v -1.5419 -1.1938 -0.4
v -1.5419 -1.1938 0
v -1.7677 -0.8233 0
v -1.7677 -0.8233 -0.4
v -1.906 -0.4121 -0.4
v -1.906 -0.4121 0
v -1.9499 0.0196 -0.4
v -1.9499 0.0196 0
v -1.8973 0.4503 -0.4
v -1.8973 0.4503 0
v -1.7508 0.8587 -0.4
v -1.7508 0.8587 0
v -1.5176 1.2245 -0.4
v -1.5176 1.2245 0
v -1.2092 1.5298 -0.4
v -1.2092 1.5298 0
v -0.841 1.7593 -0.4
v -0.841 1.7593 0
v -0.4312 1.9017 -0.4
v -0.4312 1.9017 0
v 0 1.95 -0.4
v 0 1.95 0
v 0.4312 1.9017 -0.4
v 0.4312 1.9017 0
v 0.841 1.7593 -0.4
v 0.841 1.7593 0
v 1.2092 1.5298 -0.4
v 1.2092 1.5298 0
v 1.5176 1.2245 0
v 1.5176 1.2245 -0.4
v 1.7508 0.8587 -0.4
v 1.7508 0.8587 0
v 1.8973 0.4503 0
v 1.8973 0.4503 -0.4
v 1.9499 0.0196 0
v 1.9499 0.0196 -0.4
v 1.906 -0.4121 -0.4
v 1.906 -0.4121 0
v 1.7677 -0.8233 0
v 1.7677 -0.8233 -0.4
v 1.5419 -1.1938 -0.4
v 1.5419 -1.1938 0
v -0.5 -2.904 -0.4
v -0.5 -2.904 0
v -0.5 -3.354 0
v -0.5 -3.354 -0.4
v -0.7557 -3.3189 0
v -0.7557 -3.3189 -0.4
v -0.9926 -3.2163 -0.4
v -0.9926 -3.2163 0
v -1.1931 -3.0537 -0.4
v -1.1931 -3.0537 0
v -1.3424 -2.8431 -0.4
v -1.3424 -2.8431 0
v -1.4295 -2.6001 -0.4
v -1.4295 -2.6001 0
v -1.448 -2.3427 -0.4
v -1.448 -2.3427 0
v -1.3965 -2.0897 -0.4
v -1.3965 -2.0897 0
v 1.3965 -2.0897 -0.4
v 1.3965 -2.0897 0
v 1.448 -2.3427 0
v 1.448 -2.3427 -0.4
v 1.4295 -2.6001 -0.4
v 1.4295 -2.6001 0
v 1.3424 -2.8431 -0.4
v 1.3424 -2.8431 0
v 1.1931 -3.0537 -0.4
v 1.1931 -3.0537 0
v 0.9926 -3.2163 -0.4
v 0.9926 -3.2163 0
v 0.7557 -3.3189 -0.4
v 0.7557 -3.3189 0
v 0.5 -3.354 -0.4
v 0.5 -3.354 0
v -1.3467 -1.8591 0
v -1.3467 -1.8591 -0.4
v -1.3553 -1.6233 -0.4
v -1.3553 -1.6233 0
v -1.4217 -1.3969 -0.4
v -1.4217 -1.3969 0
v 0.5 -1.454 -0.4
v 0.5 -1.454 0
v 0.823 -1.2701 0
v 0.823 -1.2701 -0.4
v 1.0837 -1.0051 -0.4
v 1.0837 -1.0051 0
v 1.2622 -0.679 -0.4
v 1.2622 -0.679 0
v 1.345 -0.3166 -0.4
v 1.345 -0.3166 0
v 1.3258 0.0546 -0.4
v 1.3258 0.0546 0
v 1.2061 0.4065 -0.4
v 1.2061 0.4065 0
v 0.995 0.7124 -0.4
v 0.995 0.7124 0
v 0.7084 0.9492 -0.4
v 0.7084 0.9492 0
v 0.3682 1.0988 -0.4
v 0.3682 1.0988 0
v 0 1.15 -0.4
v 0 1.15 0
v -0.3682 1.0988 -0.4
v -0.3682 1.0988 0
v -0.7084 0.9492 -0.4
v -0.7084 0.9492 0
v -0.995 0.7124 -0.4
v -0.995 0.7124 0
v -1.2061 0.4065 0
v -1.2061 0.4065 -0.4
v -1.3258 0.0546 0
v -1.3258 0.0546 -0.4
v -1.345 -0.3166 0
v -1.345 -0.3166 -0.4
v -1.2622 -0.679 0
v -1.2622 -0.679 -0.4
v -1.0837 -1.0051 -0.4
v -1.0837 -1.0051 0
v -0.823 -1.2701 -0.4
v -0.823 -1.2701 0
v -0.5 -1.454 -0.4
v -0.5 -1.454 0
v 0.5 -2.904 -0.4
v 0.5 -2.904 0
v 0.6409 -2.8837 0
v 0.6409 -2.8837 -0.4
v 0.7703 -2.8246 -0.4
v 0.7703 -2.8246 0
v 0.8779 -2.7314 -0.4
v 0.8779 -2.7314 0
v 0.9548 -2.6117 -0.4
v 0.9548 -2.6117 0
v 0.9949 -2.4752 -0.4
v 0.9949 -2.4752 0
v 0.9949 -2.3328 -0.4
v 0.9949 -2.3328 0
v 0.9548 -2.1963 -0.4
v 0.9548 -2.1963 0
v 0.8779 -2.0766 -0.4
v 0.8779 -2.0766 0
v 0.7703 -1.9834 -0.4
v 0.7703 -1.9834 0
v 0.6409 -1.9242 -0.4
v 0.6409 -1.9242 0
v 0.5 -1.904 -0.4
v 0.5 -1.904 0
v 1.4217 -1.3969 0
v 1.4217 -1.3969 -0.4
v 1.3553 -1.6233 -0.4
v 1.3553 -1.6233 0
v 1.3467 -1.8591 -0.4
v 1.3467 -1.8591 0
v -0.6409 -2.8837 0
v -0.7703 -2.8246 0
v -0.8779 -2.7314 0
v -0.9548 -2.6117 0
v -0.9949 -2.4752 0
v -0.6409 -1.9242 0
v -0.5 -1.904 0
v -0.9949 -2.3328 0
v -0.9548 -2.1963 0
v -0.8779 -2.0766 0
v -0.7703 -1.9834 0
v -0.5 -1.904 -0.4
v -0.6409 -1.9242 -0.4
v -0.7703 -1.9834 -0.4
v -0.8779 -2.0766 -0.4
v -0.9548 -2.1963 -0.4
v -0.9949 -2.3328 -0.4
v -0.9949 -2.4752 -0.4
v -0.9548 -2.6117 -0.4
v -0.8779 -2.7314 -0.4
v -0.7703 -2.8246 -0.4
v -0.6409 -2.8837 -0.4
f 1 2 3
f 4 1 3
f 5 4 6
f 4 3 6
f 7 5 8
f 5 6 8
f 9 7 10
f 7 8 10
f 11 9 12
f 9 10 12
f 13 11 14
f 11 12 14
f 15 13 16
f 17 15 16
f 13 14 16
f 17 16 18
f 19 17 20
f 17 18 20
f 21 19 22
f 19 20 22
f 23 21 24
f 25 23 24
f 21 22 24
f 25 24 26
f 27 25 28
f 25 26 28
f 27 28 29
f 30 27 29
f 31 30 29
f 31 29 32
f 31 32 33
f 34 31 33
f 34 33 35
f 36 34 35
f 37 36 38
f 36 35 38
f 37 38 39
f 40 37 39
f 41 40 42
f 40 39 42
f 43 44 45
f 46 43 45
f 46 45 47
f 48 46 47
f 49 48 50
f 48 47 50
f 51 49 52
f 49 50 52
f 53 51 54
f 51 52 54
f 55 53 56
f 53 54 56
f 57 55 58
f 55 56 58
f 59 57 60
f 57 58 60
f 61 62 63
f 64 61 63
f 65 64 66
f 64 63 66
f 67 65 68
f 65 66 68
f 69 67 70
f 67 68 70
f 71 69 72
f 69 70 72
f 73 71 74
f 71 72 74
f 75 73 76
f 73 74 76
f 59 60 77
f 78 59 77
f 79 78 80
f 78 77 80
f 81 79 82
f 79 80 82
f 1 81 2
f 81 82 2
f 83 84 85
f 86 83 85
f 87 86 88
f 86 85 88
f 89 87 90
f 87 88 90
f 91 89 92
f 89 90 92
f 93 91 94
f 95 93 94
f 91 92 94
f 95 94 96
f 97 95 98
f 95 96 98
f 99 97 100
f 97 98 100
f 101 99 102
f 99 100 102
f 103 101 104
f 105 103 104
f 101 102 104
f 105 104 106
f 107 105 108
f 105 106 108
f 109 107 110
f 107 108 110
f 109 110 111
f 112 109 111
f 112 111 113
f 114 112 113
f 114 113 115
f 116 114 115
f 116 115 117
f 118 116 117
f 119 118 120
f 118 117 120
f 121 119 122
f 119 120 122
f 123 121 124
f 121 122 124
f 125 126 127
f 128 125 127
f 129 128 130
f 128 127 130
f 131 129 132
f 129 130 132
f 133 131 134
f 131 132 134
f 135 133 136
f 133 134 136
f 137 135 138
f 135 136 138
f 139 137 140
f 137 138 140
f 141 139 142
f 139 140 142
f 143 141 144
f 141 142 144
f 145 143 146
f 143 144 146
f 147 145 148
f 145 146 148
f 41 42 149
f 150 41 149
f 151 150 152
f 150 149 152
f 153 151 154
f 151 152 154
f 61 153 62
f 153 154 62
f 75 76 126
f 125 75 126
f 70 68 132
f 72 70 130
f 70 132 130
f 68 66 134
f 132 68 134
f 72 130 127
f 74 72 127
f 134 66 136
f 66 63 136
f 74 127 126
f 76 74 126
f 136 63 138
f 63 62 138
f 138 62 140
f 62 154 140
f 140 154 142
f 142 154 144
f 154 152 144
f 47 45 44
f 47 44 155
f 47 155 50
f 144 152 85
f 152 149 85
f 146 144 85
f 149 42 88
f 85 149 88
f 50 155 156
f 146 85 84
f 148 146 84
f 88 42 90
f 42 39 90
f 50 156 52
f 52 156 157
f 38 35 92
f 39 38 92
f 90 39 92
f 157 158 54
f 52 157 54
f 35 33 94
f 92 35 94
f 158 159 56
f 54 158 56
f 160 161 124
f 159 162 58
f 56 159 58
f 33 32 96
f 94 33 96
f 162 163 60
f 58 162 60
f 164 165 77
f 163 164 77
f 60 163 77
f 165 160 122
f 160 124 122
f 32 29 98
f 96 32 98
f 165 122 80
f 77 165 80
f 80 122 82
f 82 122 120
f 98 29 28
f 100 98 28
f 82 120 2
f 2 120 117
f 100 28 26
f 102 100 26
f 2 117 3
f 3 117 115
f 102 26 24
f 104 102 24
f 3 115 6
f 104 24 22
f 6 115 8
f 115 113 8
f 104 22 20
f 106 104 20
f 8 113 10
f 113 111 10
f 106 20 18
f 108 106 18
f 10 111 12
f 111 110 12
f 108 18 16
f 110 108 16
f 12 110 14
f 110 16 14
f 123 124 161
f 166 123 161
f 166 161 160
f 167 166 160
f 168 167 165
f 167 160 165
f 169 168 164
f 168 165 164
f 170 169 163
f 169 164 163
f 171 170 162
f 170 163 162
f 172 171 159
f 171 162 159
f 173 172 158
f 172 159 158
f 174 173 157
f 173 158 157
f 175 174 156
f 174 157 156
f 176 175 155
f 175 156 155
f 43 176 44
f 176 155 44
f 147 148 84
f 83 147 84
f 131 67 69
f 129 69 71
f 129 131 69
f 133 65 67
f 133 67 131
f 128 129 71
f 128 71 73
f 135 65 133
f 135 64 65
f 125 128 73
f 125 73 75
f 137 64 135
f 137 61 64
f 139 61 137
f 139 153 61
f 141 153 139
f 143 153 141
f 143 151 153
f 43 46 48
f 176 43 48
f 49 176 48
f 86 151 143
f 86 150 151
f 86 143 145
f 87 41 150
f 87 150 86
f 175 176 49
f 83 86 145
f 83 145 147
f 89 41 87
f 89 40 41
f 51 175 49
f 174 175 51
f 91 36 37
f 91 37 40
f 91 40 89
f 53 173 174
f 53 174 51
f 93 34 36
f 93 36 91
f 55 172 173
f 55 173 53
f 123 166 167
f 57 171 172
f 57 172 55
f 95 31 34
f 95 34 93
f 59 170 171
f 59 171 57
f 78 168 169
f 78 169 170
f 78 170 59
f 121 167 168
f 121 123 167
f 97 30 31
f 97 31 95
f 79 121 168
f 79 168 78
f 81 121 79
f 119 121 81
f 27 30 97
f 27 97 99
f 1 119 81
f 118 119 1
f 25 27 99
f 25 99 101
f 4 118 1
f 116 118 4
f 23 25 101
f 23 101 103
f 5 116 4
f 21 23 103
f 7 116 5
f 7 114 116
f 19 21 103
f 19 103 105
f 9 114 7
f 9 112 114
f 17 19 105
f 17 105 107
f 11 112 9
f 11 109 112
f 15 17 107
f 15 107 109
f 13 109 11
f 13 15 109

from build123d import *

# Parameters (mm, degrees)
BODY_DEPTH = 0.4


with BuildPart() as part:
    # Sketch1 → Body (new body)
    with BuildSketch(Plane.XY):
        with BuildLine():
            Line((-0.5, -1.45399362), (-0.5, -1.90399362))
            ThreePointArc((-0.5, -1.90399362), (-1, -2.40399362), (-0.5, -2.90399362))
            Line((-0.5, -2.90399362), (-0.5, -3.35399362))
            ThreePointArc((-0.5, -3.35399362), (-1.274943451, -2.953504901), (-1.396505618, -2.089704458))
            ThreePointArc((-1.396505618, -2.089704458), (-1.355272146, -1.623279172), (-1.541852382, -1.193813734))
            ThreePointArc((-1.541852382, -1.193813734), (0, 1.95), (1.541852382, -1.193813734))
            ThreePointArc((1.541852382, -1.193813734), (1.355272146, -1.623279172), (1.396505618, -2.089704458))
            ThreePointArc((1.396505618, -2.089704458), (1.274943451, -2.953504901), (0.5, -3.35399362))
            Line((0.5, -3.35399362), (0.5, -2.90399362))
            ThreePointArc((0.5, -2.90399362), (1, -2.40399362), (0.5, -1.90399362))
            Line((0.5, -1.90399362), (0.5, -1.45399362))
            ThreePointArc((0.5, -1.45399362), (0, 1.15), (-0.5, -1.45399362))
        make_face()
    extrude(amount=-BODY_DEPTH)


solid = part.part
